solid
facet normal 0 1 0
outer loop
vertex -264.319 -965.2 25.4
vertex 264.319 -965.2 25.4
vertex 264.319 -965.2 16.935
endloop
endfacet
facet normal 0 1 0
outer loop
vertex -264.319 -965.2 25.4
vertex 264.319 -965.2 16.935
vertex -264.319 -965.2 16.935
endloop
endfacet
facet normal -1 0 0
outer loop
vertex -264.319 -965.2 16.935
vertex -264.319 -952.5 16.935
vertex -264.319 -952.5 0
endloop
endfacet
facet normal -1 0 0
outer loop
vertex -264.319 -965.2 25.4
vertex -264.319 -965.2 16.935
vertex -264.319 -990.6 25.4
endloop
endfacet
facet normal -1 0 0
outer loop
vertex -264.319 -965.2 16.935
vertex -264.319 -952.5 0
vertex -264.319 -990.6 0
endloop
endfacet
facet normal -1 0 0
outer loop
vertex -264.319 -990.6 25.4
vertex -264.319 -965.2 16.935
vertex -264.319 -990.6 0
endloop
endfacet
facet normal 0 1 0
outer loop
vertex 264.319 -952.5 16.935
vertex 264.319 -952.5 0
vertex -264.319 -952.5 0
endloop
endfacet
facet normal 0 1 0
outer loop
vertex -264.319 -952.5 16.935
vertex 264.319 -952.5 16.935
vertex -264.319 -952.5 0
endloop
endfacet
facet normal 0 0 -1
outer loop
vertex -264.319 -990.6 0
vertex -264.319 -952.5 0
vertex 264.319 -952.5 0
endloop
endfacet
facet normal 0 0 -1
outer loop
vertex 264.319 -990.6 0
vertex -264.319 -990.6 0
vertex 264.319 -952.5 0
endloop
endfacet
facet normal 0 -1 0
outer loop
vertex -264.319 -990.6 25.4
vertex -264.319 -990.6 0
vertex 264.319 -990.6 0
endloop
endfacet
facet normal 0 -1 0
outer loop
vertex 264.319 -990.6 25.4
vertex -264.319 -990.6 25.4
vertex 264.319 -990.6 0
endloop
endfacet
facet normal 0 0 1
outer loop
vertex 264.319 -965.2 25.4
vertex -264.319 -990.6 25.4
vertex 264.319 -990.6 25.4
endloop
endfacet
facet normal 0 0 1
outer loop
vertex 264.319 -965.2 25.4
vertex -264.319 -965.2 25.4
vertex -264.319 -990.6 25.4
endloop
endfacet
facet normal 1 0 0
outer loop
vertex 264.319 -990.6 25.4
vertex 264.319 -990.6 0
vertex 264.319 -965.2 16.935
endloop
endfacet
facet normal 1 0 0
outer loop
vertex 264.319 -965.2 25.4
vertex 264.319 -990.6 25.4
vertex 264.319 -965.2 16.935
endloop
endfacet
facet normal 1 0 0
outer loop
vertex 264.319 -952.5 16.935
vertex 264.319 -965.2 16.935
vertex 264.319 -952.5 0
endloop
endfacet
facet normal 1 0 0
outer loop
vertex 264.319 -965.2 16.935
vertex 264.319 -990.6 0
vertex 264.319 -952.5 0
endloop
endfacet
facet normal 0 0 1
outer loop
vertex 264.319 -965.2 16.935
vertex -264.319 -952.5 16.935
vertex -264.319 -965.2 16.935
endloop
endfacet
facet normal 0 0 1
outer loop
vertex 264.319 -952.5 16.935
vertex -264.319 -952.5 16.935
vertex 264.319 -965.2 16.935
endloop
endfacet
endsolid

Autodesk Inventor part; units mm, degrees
ref_plane "YZ Plane" through (0, 0, 0) normal (1, 0, 0) x (0, 1, 0)
ref_plane "XZ Plane" through (0, 0, 0) normal (0, 1, 0) x (-1, 0, 0)
ref_plane "XY Plane" through (0, 0, 0) normal (0, 0, 1) x (1, 0, 0)
ref_plane "Work Plane1" through (0, 0, 0) normal (0, 0, 1) x (1, 0, 0)
sketch "Sketch1" plane through (0, 0, 0) normal (0, 0, 1) x (1, 0, 0)
  line L0 (-264.3187, -990.6) -> (264.3188, -990.6)
  line L1 (264.3188, -990.6) -> (264.3188, -952.5)
  line L2 (264.3188, -952.5) -> (-264.3187, -952.5)
  line L3 (-264.3187, -952.5) -> (-264.3187, -990.6)
  point P0 (0, 0)
  dimension "d0" = 528.6375
  dimension "d1" = 38.1
extrude "Extrusion1" add sketch "Sketch1" along normal blind 25.4
sketch "Sketch2" plane through (0, 0, 25.4) normal (0, 0, 1) x (1, 0, 0)
  line L0 (264.3188, -990.6) -> (264.3188, -952.5) projected
  line L1 (-264.3187, -952.5) -> (264.3188, -952.5)
  line L2 (264.3188, -952.5) -> (264.3188, -965.2)
  line L3 (264.3188, -965.2) -> (-264.3187, -965.2)
  line L4 (-264.3187, -965.2) -> (-264.3187, -952.5)
  point P0 (0, 0)
  dimension "d4" = 12.7
extrude "Extrusion2" cut sketch "Sketch2" against normal blind 8.4646
properties part number "TopBottomBorder"
